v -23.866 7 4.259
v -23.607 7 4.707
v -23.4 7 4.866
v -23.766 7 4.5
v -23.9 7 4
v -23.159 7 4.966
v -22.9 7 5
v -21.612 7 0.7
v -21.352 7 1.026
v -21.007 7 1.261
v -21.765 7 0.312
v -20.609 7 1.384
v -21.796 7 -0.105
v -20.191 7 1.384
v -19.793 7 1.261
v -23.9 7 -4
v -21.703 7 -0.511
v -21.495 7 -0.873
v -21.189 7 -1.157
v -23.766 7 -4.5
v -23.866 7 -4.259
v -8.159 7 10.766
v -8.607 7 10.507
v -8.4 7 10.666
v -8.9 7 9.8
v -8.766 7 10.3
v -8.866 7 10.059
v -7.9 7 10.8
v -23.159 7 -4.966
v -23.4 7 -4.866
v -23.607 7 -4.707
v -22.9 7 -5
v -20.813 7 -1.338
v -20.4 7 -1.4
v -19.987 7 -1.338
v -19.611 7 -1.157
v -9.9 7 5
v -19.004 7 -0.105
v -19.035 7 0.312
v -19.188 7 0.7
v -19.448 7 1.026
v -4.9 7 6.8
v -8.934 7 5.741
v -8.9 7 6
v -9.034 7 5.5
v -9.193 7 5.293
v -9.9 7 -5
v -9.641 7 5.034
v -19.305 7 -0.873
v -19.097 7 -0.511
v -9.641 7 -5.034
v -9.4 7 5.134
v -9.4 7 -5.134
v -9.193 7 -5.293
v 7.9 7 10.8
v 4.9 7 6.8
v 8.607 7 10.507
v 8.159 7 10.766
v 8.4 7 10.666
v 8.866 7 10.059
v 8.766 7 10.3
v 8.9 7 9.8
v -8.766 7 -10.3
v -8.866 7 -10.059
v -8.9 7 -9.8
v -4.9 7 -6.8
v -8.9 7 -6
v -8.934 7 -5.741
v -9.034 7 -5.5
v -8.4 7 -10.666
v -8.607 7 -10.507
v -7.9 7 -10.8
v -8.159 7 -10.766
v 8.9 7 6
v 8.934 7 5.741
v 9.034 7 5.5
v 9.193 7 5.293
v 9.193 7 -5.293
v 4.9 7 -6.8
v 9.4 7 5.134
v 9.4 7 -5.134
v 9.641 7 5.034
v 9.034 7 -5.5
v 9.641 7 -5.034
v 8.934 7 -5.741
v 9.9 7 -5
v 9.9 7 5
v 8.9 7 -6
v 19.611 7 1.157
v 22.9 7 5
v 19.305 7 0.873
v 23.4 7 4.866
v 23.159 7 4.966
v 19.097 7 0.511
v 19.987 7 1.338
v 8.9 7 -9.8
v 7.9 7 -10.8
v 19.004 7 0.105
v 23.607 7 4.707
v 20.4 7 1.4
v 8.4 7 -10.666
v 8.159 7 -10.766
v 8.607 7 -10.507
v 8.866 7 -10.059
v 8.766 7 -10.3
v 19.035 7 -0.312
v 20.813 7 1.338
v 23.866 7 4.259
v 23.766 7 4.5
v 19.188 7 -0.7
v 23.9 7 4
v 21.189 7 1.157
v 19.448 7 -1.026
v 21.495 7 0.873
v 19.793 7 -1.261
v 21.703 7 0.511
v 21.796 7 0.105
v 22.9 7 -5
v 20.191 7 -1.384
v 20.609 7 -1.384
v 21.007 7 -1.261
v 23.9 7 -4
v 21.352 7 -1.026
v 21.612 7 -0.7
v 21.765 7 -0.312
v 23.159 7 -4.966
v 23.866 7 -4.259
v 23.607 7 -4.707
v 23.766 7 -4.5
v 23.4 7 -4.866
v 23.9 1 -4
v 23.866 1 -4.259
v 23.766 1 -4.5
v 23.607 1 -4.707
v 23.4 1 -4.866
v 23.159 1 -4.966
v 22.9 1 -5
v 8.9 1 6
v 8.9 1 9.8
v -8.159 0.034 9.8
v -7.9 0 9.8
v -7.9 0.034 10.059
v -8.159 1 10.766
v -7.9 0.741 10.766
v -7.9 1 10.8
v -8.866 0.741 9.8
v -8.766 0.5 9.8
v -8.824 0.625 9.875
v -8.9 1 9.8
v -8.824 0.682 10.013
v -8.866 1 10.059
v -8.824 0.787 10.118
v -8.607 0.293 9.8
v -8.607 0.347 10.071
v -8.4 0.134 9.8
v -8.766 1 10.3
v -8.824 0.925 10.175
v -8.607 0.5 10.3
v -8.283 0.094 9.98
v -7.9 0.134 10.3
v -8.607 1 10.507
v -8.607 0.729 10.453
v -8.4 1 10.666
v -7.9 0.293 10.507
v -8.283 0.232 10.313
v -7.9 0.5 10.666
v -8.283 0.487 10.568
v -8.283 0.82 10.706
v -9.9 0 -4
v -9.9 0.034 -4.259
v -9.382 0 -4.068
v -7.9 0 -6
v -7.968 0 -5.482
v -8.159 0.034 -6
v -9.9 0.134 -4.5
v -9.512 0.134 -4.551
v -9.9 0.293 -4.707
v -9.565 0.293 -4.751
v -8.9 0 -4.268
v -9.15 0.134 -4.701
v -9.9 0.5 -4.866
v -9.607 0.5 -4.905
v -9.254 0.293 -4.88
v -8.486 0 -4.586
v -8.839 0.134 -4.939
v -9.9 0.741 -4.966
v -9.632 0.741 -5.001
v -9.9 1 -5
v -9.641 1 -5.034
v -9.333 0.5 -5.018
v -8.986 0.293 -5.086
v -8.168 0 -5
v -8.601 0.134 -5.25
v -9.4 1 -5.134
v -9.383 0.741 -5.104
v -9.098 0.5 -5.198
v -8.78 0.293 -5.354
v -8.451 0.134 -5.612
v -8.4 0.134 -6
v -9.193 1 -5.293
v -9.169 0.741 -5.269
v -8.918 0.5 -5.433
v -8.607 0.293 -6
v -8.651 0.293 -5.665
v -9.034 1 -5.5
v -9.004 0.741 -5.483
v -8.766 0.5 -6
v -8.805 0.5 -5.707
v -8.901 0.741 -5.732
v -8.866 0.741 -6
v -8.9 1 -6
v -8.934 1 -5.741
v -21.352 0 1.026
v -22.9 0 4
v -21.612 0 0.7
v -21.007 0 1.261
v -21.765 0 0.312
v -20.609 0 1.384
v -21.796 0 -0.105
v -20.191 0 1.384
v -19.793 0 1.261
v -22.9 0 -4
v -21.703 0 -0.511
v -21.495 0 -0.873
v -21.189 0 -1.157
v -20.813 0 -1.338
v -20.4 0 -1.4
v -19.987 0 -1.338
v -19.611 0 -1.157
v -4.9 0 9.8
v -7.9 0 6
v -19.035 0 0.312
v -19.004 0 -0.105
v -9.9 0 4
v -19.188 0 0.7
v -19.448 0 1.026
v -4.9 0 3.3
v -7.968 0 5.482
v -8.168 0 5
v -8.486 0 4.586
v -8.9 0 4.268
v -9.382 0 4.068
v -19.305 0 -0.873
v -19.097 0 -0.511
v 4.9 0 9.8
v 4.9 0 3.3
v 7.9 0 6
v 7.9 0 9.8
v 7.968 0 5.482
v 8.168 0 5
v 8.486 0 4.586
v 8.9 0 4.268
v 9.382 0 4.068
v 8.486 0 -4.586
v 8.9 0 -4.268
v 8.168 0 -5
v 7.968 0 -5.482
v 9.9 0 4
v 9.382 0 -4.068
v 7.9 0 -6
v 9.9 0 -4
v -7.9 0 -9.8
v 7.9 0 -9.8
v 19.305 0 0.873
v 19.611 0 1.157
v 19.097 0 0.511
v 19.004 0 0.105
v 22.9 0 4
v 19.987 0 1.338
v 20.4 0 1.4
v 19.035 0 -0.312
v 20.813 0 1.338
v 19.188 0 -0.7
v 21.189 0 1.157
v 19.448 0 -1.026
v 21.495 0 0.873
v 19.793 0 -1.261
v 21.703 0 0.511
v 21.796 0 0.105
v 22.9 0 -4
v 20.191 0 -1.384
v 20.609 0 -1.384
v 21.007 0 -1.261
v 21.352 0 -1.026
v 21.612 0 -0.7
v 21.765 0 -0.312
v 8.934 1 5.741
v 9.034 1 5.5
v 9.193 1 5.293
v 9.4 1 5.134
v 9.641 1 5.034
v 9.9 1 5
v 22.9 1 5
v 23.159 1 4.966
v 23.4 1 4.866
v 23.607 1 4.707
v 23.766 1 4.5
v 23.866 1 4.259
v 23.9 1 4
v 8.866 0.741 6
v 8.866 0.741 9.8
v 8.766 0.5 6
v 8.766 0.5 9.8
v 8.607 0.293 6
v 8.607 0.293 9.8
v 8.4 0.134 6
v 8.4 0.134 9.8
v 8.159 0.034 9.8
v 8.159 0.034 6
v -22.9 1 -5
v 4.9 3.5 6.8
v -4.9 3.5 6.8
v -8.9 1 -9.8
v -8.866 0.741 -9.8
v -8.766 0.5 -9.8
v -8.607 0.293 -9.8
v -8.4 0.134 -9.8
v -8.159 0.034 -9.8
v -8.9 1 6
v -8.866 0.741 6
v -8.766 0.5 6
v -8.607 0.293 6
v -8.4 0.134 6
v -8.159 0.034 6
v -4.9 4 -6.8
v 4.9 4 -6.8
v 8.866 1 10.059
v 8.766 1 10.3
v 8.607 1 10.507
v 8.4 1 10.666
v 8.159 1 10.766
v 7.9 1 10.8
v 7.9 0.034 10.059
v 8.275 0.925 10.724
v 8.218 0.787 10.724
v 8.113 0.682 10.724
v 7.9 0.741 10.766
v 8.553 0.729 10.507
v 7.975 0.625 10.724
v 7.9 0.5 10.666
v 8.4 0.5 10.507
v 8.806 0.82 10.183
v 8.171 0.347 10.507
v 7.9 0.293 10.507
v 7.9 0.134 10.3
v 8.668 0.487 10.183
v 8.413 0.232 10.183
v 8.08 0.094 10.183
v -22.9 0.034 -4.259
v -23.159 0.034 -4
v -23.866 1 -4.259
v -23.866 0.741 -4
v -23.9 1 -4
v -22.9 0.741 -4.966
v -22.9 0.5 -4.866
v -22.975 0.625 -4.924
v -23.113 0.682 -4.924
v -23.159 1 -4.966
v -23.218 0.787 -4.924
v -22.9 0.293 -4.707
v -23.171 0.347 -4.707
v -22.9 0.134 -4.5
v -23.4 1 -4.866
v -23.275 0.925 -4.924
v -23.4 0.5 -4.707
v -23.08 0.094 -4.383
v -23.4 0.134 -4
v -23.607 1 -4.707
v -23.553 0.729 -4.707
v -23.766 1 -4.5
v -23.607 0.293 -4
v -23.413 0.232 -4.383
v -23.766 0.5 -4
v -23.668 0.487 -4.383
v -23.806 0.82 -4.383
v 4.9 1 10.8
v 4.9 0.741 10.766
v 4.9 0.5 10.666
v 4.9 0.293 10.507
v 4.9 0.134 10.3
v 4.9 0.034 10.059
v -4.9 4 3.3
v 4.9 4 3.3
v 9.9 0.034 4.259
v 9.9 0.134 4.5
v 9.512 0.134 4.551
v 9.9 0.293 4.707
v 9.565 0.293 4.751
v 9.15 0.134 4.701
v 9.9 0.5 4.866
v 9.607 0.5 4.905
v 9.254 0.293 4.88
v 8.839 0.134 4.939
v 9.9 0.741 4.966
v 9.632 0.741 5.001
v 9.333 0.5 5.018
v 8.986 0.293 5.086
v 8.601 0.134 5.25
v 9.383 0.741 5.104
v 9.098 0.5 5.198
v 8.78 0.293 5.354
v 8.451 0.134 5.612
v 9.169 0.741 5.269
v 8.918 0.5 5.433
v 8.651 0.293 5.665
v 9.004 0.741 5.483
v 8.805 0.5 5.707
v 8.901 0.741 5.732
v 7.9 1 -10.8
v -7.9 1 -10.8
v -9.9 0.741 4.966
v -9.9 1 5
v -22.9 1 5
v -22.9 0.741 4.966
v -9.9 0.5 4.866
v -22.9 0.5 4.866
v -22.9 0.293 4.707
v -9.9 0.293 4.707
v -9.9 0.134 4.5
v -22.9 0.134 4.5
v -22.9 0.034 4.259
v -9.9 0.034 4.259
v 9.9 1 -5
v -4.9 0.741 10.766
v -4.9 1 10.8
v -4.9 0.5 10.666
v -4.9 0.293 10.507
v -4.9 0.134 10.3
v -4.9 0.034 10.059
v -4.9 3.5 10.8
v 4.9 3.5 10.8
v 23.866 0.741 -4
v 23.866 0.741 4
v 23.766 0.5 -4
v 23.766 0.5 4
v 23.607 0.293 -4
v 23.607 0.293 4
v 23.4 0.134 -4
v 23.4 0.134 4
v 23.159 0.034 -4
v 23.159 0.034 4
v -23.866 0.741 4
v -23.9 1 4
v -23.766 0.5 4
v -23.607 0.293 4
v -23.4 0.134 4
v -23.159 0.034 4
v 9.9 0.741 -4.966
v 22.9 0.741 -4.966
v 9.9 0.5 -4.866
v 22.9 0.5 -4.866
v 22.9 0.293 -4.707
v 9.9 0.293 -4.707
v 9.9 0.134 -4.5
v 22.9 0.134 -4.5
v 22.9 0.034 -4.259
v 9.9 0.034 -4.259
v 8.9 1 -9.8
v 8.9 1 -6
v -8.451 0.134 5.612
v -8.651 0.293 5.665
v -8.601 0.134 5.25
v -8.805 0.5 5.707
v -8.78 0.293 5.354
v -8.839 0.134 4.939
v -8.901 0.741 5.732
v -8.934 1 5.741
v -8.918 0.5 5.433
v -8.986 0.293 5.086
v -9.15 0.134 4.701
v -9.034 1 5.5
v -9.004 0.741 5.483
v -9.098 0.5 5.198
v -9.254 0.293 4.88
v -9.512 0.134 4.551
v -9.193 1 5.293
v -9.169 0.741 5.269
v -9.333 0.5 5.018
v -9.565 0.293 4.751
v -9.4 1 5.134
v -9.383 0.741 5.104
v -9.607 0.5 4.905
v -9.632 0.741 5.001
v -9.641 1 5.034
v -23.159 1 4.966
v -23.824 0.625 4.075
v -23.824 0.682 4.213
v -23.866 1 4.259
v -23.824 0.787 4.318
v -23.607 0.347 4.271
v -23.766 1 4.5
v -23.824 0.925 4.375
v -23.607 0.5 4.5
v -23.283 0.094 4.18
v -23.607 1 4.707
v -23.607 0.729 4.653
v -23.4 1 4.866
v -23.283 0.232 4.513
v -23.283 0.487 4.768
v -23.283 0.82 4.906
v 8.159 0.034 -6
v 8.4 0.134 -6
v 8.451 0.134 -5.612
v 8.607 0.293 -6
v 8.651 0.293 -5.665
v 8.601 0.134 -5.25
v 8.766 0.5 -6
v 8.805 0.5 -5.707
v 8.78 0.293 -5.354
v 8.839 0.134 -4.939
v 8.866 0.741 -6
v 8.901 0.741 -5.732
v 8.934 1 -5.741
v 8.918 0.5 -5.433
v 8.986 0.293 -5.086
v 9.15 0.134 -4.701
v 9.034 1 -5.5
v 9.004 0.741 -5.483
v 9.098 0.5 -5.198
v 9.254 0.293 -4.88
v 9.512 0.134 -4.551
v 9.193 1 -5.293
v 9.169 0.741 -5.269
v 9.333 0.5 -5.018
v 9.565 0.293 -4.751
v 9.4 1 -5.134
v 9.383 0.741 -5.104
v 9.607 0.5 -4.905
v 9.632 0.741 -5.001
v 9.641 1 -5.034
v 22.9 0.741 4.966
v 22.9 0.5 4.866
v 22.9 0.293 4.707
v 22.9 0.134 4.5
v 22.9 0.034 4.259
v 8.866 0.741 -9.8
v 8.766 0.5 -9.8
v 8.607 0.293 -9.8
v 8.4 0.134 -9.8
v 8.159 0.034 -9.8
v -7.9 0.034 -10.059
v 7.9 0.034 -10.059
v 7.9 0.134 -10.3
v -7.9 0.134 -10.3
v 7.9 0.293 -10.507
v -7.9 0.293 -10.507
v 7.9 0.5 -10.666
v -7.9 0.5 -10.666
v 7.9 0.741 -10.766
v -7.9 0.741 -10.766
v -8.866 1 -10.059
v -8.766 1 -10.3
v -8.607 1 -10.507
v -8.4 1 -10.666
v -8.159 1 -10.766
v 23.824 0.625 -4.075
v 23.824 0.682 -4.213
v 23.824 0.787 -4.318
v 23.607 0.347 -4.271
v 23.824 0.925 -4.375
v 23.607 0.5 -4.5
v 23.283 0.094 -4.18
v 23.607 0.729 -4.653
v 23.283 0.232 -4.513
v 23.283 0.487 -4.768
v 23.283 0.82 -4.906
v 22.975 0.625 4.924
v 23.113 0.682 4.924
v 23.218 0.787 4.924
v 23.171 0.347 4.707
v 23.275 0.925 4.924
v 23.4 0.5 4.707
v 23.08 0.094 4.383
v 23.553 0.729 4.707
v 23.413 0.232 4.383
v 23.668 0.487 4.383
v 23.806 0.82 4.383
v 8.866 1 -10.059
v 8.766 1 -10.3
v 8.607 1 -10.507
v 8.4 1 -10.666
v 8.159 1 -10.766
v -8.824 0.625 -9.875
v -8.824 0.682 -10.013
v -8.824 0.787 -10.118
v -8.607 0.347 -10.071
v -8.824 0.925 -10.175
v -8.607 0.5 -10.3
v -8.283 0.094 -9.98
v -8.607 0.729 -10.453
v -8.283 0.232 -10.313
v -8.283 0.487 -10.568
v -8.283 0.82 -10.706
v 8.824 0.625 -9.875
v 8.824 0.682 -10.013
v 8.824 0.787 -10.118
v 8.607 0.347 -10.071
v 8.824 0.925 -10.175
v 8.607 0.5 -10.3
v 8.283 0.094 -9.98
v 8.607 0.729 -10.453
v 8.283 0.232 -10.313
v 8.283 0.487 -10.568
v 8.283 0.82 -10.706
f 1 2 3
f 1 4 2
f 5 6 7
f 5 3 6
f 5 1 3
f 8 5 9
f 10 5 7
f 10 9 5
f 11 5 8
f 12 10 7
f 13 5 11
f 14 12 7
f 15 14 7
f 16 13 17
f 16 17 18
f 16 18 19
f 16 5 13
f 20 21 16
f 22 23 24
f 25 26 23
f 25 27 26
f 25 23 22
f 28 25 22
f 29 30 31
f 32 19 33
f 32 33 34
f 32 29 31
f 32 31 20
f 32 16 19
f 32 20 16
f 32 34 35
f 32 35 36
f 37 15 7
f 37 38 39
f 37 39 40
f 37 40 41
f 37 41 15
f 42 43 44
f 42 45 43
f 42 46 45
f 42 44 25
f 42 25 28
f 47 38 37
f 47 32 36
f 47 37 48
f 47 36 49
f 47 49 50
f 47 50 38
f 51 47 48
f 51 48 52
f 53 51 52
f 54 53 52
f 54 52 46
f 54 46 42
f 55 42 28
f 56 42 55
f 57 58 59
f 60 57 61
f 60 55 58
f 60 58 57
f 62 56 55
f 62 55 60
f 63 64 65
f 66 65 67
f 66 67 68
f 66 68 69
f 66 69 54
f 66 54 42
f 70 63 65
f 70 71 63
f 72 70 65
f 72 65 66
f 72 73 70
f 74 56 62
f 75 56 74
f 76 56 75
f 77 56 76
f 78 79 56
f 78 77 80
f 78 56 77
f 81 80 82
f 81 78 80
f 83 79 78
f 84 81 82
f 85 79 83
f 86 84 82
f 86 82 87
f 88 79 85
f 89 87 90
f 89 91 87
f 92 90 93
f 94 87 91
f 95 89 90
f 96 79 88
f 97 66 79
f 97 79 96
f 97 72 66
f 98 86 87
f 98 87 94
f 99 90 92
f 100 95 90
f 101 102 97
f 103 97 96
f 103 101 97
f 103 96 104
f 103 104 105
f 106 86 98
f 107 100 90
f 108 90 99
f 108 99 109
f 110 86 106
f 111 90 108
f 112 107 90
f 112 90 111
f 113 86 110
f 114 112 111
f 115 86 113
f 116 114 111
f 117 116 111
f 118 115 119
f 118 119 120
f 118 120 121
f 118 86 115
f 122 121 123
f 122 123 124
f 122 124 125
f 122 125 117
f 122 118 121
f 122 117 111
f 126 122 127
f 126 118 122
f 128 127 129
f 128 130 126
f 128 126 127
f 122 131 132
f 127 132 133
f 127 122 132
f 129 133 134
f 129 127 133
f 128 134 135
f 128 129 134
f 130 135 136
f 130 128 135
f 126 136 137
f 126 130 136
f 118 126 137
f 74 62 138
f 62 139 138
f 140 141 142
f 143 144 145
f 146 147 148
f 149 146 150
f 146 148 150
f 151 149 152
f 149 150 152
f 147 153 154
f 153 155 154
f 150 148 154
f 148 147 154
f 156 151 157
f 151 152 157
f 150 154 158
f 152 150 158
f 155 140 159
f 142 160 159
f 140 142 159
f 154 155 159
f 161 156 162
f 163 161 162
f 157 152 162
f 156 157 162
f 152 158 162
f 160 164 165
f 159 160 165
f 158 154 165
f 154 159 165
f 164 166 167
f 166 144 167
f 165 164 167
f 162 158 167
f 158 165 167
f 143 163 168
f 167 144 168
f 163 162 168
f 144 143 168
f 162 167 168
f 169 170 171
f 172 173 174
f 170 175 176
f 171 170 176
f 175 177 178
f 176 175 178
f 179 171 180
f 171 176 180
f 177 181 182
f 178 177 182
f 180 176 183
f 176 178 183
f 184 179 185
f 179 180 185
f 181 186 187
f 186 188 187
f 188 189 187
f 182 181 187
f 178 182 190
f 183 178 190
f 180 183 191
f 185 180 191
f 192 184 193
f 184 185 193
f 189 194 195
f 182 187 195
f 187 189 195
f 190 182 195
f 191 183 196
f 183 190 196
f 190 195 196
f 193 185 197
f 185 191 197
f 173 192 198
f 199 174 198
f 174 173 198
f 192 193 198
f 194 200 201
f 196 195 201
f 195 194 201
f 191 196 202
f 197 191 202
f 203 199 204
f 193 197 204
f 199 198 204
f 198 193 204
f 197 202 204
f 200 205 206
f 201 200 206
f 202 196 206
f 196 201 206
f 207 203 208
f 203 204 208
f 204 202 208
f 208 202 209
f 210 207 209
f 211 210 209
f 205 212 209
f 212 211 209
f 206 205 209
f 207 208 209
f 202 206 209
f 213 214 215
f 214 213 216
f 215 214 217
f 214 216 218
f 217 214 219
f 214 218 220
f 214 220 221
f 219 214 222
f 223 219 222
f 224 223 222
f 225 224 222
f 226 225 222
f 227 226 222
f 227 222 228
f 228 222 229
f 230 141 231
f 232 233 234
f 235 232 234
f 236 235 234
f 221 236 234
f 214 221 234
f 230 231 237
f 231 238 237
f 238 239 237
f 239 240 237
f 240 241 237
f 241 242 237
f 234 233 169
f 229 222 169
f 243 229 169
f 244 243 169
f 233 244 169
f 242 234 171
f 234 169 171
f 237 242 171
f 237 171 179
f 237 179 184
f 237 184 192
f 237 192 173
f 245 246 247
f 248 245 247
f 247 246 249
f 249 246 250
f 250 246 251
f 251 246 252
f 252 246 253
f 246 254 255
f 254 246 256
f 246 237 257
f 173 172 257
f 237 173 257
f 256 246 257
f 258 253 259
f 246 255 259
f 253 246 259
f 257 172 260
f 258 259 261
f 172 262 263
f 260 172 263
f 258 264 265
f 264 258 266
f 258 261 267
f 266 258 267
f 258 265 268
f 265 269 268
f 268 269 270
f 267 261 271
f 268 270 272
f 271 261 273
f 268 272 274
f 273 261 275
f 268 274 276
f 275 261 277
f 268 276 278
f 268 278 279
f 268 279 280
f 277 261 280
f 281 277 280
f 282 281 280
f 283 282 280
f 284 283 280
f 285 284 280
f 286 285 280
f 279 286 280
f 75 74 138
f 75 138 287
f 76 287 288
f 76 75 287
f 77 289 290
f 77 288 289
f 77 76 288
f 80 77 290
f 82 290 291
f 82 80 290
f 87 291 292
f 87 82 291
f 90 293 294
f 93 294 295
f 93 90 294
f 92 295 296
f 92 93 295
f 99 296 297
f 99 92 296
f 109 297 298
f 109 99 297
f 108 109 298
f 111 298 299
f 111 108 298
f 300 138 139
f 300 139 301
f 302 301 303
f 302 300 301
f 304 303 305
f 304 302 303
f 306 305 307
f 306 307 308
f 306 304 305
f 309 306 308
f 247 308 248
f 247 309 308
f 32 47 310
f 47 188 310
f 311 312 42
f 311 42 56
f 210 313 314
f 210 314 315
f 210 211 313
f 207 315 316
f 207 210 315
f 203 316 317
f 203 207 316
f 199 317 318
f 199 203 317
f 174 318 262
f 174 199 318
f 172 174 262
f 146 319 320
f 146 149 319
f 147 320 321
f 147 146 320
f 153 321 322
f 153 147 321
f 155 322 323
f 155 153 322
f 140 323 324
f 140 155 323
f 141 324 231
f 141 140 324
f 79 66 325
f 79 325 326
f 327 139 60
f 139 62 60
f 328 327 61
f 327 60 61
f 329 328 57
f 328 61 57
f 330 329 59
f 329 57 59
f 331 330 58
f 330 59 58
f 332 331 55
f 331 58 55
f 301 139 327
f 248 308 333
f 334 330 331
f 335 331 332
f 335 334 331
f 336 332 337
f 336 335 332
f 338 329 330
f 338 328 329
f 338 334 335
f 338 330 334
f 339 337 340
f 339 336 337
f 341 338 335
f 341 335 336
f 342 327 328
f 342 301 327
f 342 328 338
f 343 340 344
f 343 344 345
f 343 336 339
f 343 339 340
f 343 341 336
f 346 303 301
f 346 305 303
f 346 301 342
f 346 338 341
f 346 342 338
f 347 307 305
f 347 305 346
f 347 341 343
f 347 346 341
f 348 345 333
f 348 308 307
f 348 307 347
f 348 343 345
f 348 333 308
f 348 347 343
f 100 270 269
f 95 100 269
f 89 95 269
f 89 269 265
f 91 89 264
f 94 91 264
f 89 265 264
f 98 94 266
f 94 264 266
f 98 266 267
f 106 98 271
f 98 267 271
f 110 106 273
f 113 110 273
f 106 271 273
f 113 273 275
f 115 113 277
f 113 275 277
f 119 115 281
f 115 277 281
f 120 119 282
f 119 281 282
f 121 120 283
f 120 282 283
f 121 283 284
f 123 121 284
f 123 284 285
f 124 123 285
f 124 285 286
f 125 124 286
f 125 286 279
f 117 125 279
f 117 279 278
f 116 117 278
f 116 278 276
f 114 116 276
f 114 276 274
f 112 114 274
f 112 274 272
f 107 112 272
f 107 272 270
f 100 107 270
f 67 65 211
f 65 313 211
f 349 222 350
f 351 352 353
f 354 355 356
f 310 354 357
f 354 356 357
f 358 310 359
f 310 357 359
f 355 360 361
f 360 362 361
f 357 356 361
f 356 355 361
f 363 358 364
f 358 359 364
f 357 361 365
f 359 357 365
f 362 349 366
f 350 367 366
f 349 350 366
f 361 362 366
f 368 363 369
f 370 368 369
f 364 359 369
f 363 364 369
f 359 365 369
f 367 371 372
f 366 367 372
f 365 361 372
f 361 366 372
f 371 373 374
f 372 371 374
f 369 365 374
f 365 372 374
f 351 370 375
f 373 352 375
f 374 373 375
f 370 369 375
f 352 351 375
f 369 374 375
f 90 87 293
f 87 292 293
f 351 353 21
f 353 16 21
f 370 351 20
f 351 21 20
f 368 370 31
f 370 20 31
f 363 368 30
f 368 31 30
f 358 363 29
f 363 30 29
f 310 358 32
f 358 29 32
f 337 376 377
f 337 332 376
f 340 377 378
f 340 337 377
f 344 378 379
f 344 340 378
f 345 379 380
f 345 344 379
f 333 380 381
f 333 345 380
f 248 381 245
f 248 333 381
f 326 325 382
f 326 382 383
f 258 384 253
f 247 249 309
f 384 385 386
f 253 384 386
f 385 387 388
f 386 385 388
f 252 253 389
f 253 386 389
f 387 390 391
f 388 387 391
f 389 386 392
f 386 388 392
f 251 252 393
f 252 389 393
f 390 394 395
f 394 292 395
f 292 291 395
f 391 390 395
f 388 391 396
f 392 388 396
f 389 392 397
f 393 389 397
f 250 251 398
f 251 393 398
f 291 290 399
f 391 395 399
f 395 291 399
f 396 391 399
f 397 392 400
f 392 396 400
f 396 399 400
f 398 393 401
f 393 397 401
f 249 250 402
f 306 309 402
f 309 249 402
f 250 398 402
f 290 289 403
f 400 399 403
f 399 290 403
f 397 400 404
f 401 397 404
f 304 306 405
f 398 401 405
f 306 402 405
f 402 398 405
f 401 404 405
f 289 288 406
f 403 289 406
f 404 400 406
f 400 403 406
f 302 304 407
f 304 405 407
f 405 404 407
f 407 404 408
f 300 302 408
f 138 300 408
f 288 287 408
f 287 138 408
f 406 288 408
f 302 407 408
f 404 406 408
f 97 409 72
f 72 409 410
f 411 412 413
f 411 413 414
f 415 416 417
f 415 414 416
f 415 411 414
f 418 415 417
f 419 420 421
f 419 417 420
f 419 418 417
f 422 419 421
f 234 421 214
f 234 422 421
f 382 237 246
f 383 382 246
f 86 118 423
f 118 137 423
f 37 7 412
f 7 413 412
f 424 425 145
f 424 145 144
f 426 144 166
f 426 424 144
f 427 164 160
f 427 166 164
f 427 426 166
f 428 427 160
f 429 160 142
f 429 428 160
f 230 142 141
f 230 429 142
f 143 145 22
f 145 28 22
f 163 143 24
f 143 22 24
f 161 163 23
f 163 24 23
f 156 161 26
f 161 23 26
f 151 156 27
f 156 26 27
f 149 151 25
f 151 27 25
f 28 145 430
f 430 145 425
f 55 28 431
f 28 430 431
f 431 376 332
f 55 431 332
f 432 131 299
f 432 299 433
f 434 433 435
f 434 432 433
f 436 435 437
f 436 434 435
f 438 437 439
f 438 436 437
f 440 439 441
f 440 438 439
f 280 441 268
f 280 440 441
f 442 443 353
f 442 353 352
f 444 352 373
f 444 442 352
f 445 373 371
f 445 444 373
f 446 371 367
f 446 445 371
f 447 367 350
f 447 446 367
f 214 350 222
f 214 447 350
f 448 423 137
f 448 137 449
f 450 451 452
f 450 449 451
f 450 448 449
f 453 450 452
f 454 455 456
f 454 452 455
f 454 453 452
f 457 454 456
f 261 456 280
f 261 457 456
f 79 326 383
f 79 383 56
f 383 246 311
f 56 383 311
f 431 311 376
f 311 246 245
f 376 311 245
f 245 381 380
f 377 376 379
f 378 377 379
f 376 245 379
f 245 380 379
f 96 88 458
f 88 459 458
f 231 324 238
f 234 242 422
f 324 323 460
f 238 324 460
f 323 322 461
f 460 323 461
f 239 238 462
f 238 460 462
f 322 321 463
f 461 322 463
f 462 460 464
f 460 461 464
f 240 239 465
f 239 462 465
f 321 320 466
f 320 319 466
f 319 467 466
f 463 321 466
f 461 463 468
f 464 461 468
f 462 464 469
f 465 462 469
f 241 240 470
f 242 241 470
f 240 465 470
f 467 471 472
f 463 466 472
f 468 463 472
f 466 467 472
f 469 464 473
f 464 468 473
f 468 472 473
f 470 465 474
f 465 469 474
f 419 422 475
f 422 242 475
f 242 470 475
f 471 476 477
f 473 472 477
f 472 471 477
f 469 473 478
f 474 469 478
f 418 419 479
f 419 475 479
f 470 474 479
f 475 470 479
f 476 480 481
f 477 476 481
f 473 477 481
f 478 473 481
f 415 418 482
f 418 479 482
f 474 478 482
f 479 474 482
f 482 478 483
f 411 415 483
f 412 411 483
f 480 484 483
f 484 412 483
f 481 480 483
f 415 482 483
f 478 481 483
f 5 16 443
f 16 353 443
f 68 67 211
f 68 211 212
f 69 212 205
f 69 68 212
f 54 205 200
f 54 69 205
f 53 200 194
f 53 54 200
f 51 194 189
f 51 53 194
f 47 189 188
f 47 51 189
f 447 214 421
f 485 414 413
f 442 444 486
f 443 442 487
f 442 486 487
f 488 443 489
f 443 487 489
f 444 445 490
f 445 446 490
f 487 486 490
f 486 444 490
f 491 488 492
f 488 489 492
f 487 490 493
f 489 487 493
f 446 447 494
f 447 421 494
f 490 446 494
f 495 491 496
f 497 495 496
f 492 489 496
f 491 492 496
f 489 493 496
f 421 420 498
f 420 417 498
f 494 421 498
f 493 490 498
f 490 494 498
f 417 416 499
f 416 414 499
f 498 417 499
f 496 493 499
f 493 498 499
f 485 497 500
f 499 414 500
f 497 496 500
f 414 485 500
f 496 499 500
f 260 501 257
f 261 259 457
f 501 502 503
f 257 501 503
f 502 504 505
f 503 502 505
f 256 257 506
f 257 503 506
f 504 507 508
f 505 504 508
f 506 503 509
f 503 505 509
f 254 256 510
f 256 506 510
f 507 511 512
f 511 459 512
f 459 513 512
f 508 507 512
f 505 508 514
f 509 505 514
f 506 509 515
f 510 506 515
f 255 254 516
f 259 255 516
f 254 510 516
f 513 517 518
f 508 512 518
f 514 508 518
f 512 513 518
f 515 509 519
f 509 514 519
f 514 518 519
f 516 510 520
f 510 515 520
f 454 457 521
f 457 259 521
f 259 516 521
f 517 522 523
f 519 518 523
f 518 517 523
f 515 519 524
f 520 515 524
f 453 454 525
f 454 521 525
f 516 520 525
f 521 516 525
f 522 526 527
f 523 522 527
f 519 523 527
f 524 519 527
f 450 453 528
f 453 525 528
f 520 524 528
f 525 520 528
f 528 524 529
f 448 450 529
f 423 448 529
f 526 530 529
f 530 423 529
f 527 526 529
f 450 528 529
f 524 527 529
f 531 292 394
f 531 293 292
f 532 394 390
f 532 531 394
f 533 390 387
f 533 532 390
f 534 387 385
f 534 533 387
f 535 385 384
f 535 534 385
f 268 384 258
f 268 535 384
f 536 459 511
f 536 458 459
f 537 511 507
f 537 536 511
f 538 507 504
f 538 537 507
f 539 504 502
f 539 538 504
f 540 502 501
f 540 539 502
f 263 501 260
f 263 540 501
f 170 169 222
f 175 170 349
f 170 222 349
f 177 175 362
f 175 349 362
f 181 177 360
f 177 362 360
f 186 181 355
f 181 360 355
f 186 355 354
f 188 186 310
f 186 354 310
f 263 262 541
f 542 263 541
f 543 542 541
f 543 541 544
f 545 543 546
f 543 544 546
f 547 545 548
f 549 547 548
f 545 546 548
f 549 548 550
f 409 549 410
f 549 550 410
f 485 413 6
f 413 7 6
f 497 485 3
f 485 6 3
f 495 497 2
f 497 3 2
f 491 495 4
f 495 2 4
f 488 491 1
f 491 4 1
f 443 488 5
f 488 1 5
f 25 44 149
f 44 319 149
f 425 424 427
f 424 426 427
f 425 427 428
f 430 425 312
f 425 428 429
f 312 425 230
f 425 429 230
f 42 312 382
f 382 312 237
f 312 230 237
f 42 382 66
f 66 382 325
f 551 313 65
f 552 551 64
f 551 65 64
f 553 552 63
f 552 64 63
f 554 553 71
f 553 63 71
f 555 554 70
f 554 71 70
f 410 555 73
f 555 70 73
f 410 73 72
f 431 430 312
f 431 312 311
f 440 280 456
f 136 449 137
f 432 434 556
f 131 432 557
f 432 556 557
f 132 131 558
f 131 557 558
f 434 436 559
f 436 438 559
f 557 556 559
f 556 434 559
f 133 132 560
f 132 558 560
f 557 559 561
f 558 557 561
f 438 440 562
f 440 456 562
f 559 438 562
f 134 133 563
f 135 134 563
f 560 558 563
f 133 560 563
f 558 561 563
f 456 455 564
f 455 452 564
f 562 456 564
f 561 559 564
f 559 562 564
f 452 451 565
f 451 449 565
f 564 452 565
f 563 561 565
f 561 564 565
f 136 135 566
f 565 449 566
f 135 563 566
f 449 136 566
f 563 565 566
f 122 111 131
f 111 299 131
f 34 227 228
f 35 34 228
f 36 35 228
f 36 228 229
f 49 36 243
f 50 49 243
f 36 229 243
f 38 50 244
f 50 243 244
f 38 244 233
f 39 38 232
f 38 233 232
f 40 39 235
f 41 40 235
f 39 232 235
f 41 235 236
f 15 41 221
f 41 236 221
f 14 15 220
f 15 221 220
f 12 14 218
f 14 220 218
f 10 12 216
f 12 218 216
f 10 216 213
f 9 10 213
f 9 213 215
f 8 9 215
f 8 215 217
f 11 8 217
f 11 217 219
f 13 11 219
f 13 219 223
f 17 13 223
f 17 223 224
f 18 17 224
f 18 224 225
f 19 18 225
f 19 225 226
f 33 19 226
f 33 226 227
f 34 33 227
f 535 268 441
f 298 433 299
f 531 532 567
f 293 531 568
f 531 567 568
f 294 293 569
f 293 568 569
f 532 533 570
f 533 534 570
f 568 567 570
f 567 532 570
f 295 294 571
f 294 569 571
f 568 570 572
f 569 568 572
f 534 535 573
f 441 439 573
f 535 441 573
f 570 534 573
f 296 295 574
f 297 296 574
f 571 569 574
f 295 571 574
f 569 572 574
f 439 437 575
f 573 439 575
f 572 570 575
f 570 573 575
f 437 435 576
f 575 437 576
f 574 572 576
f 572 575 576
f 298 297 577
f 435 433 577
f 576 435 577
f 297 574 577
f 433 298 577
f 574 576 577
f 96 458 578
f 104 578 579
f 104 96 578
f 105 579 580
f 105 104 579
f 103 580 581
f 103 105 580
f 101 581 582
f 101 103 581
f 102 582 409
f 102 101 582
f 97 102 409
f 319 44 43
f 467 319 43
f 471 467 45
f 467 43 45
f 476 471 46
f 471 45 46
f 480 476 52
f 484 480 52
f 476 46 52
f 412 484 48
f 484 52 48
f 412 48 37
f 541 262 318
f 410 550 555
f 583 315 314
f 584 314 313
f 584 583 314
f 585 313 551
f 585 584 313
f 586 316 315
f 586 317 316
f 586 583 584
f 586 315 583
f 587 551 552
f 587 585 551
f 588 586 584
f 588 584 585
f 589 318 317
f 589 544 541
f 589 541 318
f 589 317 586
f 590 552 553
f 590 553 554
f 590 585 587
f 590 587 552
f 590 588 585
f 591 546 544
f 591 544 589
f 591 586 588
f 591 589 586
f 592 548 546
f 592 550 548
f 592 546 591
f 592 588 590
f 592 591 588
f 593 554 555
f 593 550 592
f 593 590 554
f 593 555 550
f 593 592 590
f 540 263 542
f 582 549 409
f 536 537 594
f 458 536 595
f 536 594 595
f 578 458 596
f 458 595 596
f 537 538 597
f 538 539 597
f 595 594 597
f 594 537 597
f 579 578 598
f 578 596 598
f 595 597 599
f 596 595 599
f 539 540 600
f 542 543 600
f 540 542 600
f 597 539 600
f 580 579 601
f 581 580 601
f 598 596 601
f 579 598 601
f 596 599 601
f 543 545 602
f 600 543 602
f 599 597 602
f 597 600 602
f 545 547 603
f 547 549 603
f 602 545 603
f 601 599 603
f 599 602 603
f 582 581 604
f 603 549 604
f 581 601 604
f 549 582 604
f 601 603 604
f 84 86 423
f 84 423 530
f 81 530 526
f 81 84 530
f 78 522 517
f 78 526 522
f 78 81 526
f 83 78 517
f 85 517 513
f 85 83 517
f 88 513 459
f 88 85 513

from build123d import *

# Parameters (mm, degrees)
SKETCH1_W                 = 9.8
SKETCH1_H                 = 3.5
BASE_DEPTH                = 7
SKETCH2_W                 = 9.8
SKETCH2_H                 = 13.6
PCB_CUTOUT_DEPTH          = 3
SKETCH5_R                 = 1.4
SCREW_HOLES_DEPTH         = 28.14498112
SKETCH6_W                 = 9.8
SKETCH6_H                 = 4
PIN_HEADERS_OPENING_DEPTH = 3.5
F_1MM_EDGE_FILLETS_R      = 1


with BuildPart() as part:
    # Sketch1 → Base (new body)
    with BuildSketch(Plane(origin=(0, 0, 0), x_dir=(1, 0, 0), z_dir=(0, 1, 0))):
        Polygon((-8.9, 10.8), (-8.9, 5), (-23.9, 5), (-23.9, -5), (-8.9, -5), (-8.9, -10.8), (8.9, -10.8), (8.9, -5), (23.9, -5), (23.9, 5), (8.9, 5), (8.9, 10.8), (0, 10.8), align=None)
        with Locations((0, -5.05)):
            Rectangle(SKETCH1_W, SKETCH1_H, mode=Mode.SUBTRACT)
    extrude(amount=BASE_DEPTH)

    # Sketch2 → PCB Cutout (cut)
    with BuildSketch(Plane(origin=(0, 7, 0), x_dir=(1, 0, 0), z_dir=(0, 1, 0))):
        Rectangle(SKETCH2_W, SKETCH2_H)
    extrude(amount=-PCB_CUTOUT_DEPTH, mode=Mode.SUBTRACT)

    # Sketch5 → Screw Holes (cut, through all)
    with BuildSketch(Plane.XZ):
        with Locations((-20.4, 0)):
            Circle(SKETCH5_R)
        with Locations((20.4, 0)):
            Circle(SKETCH5_R)
    extrude(amount=-SCREW_HOLES_DEPTH, mode=Mode.SUBTRACT)

    # Sketch6 → Pin Headers Opening (cut)
    with BuildSketch(Plane.XZ):
        with Locations((0, 8.8)):
            Rectangle(SKETCH6_W, SKETCH6_H)
    extrude(amount=-PIN_HEADERS_OPENING_DEPTH, mode=Mode.SUBTRACT)

    # 1mm Edge Fillets
    f_1mm_edge_fillets_edges = [part.edges().sort_by_distance(p)[0] for p in [
        (-8.9, 3.5, -10.8),
        (8.9, 3.5, -10.8),
        (8.9, 3.5, -5),
        (23.9, 3.5, -5),
        (23.9, 3.5, 5),
        (8.9, 3.5, 5),
        (8.9, 3.5, 10.8),
        (-8.9, 3.5, 10.8),
        (-8.9, 3.5, 5),
        (-8.9, 3.5, -5),
        (-23.9, 3.5, -5),
        (-23.9, 3.5, 5),
        (-8.9, 0, 7.9),
        (-8.9, 0, -7.9),
        (8.9, 0, -7.9),
        (8.9, 0, 7.9),
        (6.9, 0, 10.8),
        (-6.9, 0, 10.8),
        (-16.4, 0, 5),
        (-23.9, 0, 0),
        (-16.4, 0, -5),
        (0, 0, -10.8),
        (16.4, 0, -5),
        (23.9, 0, 0),
        (16.4, 0, 5),
    ]]
    fillet(f_1mm_edge_fillets_edges, radius=F_1MM_EDGE_FILLETS_R)


solid = part.part
